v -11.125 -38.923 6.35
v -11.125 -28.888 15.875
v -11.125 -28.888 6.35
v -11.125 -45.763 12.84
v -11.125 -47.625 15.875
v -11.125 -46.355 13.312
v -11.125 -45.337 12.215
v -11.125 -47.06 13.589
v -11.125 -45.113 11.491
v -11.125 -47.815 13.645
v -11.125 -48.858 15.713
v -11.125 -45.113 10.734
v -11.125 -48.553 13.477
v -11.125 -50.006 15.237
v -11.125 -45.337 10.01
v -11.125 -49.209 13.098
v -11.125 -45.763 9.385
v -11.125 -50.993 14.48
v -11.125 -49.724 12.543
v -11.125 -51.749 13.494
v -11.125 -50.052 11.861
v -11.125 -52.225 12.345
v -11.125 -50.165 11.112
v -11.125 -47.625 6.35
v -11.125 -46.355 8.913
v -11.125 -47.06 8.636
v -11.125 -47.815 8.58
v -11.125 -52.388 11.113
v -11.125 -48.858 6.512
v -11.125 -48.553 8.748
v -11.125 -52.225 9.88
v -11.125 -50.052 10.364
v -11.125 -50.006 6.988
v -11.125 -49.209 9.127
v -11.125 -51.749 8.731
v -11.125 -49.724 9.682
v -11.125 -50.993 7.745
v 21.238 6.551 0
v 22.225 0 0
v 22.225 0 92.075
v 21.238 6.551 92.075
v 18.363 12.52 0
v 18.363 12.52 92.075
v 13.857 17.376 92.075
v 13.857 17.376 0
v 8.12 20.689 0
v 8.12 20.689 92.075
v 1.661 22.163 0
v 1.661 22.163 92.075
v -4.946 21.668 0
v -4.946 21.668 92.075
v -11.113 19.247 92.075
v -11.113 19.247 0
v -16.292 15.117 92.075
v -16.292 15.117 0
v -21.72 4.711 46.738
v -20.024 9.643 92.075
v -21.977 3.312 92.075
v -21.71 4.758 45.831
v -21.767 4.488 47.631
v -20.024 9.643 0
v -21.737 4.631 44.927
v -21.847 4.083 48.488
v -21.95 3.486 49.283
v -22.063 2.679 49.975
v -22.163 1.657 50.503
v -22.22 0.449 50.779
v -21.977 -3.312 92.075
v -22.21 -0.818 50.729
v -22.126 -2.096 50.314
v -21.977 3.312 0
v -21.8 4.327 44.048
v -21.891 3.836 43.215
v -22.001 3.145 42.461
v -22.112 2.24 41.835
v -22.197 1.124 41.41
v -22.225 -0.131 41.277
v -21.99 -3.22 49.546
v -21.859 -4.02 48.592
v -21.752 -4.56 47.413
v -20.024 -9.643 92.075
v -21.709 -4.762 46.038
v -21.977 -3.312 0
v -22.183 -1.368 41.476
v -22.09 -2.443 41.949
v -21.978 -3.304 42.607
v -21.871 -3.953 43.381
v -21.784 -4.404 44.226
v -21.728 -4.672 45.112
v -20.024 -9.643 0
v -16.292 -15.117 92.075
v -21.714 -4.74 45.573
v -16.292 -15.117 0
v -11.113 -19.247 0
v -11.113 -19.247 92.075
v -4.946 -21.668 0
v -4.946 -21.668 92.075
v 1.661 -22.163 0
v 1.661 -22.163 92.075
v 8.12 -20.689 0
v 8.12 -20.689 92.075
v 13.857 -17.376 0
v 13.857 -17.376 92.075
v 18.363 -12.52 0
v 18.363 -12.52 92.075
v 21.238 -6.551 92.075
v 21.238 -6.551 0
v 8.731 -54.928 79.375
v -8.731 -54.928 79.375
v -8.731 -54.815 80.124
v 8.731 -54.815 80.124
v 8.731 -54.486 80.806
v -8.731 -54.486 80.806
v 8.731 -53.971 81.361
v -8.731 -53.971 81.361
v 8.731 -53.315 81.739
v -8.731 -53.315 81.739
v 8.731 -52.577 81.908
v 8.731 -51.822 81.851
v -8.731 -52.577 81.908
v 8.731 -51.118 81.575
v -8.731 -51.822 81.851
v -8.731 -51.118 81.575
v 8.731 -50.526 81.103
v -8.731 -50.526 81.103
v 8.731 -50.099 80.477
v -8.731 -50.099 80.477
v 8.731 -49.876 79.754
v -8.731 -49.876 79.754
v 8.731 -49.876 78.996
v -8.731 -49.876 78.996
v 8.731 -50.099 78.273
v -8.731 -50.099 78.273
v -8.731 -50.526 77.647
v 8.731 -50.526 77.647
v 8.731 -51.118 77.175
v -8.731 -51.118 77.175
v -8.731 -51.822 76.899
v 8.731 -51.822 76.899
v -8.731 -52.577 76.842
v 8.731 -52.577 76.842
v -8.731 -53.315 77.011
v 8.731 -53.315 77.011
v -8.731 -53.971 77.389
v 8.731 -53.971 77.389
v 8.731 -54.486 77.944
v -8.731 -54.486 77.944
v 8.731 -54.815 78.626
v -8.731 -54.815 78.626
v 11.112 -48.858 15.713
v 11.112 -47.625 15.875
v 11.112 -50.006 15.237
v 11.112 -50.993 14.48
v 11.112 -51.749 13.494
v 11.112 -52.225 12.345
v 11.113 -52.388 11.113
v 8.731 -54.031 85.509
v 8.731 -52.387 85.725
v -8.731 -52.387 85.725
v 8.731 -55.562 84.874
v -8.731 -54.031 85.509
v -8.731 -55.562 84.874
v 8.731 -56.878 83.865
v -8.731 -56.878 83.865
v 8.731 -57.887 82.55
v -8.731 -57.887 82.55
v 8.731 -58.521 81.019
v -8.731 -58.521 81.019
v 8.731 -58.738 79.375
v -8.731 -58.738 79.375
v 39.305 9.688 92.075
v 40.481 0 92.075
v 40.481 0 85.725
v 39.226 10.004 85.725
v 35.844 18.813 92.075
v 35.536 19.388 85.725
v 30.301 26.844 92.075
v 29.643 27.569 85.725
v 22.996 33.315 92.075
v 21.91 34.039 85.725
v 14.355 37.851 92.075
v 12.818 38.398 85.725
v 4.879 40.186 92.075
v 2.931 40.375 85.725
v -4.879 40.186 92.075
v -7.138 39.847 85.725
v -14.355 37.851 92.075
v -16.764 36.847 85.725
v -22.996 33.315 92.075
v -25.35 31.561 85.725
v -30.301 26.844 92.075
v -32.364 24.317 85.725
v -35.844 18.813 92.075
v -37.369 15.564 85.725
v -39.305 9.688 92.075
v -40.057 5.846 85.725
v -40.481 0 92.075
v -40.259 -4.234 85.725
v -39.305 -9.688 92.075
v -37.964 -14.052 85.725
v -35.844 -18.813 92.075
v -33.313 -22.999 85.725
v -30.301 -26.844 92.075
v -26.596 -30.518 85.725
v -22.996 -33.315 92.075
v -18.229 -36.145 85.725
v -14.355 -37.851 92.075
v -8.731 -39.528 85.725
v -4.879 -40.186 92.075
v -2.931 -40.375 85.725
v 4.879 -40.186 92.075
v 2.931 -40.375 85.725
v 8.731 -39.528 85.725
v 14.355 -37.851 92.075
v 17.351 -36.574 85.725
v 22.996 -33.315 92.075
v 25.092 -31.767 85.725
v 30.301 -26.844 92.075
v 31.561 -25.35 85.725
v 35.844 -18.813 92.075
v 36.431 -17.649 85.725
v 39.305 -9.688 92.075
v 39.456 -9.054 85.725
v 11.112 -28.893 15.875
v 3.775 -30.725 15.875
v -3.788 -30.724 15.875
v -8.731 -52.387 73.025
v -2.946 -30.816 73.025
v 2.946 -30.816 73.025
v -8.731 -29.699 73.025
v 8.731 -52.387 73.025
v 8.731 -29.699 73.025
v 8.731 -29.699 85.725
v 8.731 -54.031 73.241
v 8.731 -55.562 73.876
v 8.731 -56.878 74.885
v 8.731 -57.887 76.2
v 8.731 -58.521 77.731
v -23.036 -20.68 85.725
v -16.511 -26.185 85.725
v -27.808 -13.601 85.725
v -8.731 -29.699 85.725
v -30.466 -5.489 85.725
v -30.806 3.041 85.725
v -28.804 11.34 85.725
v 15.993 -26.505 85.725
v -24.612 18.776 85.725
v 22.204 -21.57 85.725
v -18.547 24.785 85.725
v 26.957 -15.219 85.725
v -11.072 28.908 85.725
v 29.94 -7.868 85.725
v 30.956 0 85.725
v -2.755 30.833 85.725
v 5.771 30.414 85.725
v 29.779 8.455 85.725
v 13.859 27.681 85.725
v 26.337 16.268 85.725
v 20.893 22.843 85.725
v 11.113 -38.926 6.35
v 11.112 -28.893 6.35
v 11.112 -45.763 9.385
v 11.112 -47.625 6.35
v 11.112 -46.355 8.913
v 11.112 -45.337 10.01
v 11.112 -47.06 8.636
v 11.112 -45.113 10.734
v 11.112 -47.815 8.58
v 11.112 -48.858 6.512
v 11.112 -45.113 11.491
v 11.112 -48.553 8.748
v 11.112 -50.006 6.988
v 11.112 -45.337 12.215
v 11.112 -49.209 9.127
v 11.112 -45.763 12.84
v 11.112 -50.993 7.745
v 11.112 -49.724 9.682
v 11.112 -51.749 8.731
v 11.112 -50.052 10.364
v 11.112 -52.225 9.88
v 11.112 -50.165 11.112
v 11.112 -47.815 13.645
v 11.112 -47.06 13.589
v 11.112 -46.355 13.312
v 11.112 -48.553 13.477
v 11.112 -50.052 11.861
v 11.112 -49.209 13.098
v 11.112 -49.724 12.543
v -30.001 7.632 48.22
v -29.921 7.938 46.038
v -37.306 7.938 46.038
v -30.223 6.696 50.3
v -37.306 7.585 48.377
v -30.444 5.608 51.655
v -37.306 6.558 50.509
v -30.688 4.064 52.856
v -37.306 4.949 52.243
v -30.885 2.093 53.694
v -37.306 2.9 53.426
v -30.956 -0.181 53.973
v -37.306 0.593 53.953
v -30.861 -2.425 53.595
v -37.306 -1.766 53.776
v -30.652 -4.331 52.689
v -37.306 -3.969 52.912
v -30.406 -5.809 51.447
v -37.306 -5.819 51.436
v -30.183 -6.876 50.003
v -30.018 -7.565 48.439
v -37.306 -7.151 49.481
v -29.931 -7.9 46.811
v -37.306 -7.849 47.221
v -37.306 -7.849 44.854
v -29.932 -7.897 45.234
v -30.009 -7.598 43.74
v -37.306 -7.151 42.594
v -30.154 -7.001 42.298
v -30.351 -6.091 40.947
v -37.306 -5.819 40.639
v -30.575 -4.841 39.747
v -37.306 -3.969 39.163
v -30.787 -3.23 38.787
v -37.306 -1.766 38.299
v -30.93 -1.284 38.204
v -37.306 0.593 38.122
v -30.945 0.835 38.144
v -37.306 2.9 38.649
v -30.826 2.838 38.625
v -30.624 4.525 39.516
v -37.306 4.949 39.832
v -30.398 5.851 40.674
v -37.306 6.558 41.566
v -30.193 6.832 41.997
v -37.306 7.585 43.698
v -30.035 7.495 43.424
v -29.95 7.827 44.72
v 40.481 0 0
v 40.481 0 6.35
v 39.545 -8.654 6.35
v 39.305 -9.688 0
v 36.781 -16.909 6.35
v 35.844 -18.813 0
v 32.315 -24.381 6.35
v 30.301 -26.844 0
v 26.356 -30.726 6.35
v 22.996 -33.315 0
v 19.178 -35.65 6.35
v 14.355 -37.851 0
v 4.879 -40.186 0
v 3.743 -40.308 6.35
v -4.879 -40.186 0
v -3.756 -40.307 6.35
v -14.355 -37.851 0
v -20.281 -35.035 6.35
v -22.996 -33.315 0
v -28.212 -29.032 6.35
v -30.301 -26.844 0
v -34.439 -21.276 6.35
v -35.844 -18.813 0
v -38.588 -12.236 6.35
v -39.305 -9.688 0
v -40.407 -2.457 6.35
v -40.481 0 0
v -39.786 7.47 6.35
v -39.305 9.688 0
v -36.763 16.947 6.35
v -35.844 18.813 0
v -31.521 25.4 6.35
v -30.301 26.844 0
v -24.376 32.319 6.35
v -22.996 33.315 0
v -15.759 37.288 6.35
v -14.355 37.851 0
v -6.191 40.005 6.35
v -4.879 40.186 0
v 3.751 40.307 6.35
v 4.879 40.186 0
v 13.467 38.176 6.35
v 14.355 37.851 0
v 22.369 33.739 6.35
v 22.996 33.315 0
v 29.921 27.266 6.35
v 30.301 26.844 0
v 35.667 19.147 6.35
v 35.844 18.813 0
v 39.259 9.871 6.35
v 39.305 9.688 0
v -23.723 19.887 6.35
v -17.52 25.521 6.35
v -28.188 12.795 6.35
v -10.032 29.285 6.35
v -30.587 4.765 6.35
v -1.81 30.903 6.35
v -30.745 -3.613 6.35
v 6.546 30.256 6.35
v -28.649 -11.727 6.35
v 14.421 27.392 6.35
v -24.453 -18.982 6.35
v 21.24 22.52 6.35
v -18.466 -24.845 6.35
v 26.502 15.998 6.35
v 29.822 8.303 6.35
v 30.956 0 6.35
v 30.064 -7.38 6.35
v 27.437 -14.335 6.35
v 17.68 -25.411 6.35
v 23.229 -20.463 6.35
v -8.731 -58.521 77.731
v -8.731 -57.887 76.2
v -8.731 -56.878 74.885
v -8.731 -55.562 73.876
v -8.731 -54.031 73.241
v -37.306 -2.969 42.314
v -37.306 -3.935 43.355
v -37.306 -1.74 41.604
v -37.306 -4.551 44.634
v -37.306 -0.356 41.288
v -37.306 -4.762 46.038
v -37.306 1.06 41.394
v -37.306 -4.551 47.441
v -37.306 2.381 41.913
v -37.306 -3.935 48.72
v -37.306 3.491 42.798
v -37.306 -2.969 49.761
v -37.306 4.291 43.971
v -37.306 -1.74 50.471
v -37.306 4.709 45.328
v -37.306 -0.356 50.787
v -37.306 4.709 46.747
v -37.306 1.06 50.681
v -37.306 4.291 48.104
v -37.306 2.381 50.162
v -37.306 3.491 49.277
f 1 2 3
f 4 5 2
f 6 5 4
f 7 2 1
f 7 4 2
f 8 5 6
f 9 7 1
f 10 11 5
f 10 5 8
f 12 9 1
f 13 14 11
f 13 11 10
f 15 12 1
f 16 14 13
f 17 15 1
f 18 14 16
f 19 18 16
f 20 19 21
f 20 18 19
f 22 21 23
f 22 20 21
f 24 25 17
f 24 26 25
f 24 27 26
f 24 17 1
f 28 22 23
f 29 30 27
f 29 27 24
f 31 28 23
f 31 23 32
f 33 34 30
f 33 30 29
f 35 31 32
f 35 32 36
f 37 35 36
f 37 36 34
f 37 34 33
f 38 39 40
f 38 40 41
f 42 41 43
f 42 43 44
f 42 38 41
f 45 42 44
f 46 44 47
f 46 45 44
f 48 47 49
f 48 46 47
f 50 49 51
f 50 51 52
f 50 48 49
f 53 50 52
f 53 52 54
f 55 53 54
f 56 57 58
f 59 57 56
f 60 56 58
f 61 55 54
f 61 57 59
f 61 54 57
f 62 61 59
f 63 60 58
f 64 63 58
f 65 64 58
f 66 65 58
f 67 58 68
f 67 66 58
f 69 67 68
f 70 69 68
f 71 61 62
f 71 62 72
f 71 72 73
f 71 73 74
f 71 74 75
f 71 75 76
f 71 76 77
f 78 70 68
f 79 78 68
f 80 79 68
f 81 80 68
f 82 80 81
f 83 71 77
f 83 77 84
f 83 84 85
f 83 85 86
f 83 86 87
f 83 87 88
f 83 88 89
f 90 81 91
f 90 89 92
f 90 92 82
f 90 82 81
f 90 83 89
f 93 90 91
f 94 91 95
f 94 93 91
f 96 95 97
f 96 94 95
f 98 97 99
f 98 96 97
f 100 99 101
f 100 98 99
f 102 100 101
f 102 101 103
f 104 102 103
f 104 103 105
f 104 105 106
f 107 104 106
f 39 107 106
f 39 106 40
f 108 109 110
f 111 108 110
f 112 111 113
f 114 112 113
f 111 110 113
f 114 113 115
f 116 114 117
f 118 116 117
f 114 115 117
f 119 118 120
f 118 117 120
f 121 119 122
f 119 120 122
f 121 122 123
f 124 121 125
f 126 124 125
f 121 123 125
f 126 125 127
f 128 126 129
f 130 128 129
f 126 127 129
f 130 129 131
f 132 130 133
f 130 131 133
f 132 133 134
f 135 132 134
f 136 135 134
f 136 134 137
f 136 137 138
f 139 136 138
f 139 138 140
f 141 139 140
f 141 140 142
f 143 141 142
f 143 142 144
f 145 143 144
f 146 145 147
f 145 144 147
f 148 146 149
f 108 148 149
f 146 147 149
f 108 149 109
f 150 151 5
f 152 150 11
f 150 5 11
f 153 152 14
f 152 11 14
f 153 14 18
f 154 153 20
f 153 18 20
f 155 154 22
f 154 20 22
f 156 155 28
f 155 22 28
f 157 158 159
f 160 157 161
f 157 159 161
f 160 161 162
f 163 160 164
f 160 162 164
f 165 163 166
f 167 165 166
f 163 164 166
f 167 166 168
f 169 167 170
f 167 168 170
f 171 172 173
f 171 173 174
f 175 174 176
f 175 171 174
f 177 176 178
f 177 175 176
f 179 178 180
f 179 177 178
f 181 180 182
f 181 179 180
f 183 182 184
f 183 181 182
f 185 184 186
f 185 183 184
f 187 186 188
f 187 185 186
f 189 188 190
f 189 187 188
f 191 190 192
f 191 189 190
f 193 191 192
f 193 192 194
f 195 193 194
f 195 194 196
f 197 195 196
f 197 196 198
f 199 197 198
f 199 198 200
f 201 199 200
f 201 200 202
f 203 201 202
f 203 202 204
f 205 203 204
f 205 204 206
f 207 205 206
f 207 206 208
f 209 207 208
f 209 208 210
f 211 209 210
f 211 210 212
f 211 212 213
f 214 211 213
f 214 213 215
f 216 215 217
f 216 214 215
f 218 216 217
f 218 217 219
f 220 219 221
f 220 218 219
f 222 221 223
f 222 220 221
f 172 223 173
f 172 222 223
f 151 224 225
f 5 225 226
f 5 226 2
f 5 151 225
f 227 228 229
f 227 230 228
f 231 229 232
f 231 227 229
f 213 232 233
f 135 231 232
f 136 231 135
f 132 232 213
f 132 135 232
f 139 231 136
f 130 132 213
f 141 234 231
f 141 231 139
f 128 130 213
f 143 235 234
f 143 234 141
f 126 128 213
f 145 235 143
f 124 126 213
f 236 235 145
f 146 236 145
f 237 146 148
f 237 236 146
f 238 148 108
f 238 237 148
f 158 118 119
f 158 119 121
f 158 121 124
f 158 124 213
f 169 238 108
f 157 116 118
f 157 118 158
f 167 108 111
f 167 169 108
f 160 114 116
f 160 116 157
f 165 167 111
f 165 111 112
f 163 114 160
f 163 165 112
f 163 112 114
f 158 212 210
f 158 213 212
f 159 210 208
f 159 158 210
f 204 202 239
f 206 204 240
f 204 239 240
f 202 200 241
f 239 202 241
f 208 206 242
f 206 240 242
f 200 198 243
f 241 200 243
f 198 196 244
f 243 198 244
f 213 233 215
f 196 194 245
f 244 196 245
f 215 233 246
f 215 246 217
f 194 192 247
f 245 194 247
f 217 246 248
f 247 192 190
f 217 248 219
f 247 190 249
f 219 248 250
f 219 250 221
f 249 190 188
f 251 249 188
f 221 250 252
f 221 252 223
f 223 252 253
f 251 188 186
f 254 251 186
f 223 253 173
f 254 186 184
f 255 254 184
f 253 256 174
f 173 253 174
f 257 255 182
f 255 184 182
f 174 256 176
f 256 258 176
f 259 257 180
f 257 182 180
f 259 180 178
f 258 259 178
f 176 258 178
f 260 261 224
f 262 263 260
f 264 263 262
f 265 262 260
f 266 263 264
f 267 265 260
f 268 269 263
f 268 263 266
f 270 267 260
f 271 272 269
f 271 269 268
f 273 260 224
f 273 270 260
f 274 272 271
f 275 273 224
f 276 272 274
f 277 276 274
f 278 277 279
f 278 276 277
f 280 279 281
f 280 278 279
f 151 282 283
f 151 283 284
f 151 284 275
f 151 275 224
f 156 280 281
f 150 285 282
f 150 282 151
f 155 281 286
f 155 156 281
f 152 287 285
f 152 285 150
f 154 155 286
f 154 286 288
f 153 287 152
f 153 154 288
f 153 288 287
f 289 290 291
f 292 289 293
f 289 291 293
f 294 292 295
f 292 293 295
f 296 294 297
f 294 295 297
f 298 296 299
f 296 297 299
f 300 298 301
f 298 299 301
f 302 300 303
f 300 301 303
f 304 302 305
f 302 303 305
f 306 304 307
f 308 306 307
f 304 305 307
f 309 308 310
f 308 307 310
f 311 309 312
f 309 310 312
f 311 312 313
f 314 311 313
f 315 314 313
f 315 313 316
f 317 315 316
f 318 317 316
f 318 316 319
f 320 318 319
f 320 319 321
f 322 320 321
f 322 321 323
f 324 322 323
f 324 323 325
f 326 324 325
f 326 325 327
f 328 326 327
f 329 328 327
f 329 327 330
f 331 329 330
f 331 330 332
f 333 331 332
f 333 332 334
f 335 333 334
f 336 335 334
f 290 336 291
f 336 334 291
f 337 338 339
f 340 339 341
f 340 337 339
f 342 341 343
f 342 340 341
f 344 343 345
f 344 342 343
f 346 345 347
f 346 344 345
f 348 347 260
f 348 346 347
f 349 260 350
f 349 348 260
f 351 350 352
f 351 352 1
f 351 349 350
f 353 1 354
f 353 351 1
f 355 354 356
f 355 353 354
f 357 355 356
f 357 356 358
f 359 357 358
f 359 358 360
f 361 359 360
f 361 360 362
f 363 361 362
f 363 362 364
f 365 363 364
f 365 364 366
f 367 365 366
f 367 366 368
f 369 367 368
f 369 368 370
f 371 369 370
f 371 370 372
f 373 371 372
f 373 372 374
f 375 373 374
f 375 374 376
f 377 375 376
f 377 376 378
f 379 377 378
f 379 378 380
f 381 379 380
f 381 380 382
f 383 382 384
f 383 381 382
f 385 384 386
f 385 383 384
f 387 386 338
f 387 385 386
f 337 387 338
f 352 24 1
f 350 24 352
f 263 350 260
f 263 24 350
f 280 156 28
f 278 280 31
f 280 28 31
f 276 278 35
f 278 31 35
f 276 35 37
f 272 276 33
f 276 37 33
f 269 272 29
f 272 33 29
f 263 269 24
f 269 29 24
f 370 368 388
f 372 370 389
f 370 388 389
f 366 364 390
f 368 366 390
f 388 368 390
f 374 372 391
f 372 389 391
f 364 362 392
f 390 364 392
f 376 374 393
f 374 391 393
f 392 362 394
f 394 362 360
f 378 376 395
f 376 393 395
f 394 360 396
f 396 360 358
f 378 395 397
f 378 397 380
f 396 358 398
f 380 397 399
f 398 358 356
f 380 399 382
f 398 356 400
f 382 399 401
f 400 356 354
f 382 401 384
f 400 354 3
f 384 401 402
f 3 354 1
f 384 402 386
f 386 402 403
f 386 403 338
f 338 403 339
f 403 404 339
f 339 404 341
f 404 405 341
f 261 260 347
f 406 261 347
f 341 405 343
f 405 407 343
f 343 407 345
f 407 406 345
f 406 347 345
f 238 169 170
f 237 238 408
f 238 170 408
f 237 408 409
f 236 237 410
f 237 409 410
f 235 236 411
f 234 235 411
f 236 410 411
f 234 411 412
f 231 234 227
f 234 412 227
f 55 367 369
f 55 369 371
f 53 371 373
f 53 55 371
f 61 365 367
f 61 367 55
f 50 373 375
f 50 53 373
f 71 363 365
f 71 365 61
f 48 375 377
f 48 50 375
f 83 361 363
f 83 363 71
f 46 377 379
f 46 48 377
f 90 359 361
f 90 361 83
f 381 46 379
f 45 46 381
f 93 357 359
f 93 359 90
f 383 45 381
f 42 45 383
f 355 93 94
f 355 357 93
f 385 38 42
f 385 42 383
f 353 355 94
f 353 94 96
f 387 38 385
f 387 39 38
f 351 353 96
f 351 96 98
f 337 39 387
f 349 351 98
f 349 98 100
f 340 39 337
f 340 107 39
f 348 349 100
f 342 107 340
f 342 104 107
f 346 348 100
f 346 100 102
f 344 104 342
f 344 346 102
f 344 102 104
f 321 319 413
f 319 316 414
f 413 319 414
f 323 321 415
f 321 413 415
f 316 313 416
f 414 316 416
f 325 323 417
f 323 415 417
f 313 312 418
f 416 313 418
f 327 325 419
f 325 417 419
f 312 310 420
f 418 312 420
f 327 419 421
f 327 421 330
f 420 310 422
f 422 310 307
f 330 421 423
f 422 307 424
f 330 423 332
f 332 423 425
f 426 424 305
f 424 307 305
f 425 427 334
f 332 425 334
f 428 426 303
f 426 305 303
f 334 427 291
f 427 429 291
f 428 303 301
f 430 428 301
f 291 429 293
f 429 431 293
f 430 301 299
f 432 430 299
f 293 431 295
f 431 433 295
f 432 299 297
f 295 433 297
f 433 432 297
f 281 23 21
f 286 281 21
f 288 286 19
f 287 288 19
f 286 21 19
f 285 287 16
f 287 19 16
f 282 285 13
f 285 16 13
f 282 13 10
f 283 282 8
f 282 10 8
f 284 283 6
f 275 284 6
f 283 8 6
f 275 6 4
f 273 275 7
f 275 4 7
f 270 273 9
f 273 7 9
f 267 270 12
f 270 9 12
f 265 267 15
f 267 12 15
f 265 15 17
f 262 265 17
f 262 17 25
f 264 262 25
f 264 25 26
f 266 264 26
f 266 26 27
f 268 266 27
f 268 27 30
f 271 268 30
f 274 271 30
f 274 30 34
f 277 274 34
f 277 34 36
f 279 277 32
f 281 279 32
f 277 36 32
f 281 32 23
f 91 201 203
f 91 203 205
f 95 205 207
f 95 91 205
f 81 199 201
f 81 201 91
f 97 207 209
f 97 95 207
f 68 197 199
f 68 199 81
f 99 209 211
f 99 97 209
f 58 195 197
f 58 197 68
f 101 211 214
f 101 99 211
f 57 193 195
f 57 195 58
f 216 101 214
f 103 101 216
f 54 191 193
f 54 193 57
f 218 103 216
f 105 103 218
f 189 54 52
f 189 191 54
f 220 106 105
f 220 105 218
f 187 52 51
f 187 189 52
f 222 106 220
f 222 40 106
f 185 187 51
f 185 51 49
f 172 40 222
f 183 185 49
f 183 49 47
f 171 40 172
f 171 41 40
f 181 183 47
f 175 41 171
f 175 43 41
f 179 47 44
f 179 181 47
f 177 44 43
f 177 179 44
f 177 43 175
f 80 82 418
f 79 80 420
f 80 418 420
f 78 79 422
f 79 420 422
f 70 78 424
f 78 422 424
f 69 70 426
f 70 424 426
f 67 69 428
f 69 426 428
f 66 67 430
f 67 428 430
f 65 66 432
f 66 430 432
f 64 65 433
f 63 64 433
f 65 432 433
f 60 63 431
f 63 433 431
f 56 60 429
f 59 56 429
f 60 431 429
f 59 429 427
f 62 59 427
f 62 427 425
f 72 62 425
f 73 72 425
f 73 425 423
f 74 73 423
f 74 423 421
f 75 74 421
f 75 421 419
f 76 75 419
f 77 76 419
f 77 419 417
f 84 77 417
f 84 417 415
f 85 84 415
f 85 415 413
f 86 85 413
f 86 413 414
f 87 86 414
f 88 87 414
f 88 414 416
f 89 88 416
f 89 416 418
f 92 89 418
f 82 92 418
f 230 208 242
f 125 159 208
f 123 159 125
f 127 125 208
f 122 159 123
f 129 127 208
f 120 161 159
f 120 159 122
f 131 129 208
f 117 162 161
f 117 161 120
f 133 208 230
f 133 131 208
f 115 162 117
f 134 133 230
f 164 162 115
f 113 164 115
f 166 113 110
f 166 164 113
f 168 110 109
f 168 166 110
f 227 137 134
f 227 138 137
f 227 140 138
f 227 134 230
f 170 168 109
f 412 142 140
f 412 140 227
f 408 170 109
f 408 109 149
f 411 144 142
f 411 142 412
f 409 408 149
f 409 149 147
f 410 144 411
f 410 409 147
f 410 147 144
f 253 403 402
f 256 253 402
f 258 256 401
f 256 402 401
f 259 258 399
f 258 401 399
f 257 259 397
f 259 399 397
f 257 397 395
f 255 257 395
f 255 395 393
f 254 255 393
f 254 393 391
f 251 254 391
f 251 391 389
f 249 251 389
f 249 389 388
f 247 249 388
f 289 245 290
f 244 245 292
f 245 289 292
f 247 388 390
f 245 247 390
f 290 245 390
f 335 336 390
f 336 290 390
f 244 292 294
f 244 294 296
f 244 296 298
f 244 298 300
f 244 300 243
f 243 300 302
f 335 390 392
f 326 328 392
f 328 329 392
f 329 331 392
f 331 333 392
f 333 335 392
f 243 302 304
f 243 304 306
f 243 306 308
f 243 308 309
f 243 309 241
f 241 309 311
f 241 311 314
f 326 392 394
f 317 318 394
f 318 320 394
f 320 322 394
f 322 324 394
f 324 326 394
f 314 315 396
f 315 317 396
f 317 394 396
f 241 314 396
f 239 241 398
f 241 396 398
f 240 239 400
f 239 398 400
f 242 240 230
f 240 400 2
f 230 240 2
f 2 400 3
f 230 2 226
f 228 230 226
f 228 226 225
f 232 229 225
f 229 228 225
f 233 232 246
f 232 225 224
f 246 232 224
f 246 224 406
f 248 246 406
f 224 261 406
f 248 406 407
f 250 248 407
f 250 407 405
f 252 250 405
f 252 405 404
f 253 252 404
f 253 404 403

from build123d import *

# Parameters (mm, degrees)
F0_R      = 30.95625
F0_R_2    = 22.225
F1_DEPTH  = 92.075
F2_R      = 40.48125
F2_R_2    = 30.95625
F3_DEPTH  = 6.35
F4_R      = 40.48125
F4_R_2    = 30.95625
F5_DEPTH  = 6.35
F13_R     = 7.9375
F15_R     = 2.54
F16_DEPTH = 17.4625
F17_R     = 2.54
F18_DEPTH = 22.2377
F19_R     = 4.7625
F20_DEPTH = 16.002


with BuildPart() as f1:
    # F0 (on Top) → F1 (new body)
    with BuildSketch(Plane.XY):
        Circle(F0_R)
        Circle(F0_R_2, mode=Mode.SUBTRACT)
    extrude(amount=F1_DEPTH)

    # F2 (on face) → F3 (join)
    with BuildSketch(Plane.XY.offset(92.075)):
        Circle(F2_R)
        Circle(F2_R_2, mode=Mode.SUBTRACT)
    extrude(amount=-F3_DEPTH)

    # F4 (on face) → F5 (join)
    with BuildSketch(Plane(origin=(0, 0, 0), x_dir=(1, 0, 0), z_dir=(0, 0, -1))):
        Circle(F4_R)
        Circle(F4_R_2, mode=Mode.SUBTRACT)
    extrude(amount=-F5_DEPTH)

    # F7 (on offset) → F8 (join, up to the next surface of F1)
    with BuildSketch(Plane.XZ.offset(58.7375)):
        Polygon((-8.73125, 73.025), (0, 73.025), (8.73125, 73.025), (8.73125, 85.725), (-8.73125, 85.725), align=None)
    extrude(until=Until.NEXT, dir=(0, 1, 0))

    # F10 (on offset) → F11 (join, up to the next surface of F1)
    with BuildSketch(Plane.XZ.offset(52.3875)):
        Polygon((11.1125, 15.875), (0, 15.875), (-11.1252, 15.875), (-11.1252, 6.35), (11.1125, 6.35), align=None)
    extrude(until=Until.NEXT, dir=(0, 1, 0))

    # F13 (on offset) → F14 (join, up to the next surface of F1)
    with BuildSketch(Plane.YZ.offset(-37.30625)):
        with Locations((0, 46.0375)):
            Circle(F13_R)
    extrude(until=Until.NEXT)

    # F15 (on face) → F16 (cut, through all)
    with BuildSketch(Plane(origin=(-8.73125, 0, 0), x_dir=(0, -1, 0), z_dir=(-1, 0, 0))):
        with BuildLine():
            ThreePointArc((52.3874999998, 85.725), (56.8776280605, 83.8651280606), (58.7375, 79.375))
            Line((58.7375, 79.375), (58.7375, 85.725))
            Line((58.7374999992, 85.725), (52.3874999994, 85.725))
        make_face()
        with BuildLine():
            ThreePointArc((58.7375, 79.375), (56.8776280605, 74.8848719394), (52.3874999998, 73.025))
            Line((52.3874999994, 73.025), (58.7374999992, 73.025))
            Line((58.7375, 73.025), (58.7375, 79.375))
        make_face()
        with Locations((52.3875, 79.375)):
            Circle(F15_R)
    extrude(amount=-F16_DEPTH, mode=Mode.SUBTRACT)

    # F17 (on face) → F18 (cut, through all)
    with BuildSketch(Plane(origin=(-11.1252, 0, 0), x_dir=(0, -1, 0), z_dir=(-1, 0, 0))):
        with BuildLine():
            ThreePointArc((47.6249999998, 15.875), (50.9925960453, 14.4800960455), (52.3875, 11.1125))
            Line((52.3875, 11.1125), (52.3875, 15.875))
            Line((52.3874999992, 15.875), (47.6249999994, 15.875))
        make_face()
        with BuildLine():
            ThreePointArc((52.3875, 11.1125), (50.9925960453, 7.7449039545), (47.6249999998, 6.35))
            Line((47.6249999994, 6.35), (52.3874999992, 6.35))
            Line((52.3875, 6.35), (52.3875, 11.1125))
        make_face()
        with Locations((47.625, 11.1125)):
            Circle(F17_R)
    extrude(amount=-F18_DEPTH, mode=Mode.SUBTRACT)

    # F19 (on face) → F20 (cut)
    with BuildSketch(Plane(origin=(-37.30625, 0, 0), x_dir=(0, -1, 0), z_dir=(-1, 0, 0))):
        with Locations((0, 46.0375)):
            Circle(F19_R)
    extrude(amount=-F20_DEPTH, mode=Mode.SUBTRACT)


solid = f1.part
